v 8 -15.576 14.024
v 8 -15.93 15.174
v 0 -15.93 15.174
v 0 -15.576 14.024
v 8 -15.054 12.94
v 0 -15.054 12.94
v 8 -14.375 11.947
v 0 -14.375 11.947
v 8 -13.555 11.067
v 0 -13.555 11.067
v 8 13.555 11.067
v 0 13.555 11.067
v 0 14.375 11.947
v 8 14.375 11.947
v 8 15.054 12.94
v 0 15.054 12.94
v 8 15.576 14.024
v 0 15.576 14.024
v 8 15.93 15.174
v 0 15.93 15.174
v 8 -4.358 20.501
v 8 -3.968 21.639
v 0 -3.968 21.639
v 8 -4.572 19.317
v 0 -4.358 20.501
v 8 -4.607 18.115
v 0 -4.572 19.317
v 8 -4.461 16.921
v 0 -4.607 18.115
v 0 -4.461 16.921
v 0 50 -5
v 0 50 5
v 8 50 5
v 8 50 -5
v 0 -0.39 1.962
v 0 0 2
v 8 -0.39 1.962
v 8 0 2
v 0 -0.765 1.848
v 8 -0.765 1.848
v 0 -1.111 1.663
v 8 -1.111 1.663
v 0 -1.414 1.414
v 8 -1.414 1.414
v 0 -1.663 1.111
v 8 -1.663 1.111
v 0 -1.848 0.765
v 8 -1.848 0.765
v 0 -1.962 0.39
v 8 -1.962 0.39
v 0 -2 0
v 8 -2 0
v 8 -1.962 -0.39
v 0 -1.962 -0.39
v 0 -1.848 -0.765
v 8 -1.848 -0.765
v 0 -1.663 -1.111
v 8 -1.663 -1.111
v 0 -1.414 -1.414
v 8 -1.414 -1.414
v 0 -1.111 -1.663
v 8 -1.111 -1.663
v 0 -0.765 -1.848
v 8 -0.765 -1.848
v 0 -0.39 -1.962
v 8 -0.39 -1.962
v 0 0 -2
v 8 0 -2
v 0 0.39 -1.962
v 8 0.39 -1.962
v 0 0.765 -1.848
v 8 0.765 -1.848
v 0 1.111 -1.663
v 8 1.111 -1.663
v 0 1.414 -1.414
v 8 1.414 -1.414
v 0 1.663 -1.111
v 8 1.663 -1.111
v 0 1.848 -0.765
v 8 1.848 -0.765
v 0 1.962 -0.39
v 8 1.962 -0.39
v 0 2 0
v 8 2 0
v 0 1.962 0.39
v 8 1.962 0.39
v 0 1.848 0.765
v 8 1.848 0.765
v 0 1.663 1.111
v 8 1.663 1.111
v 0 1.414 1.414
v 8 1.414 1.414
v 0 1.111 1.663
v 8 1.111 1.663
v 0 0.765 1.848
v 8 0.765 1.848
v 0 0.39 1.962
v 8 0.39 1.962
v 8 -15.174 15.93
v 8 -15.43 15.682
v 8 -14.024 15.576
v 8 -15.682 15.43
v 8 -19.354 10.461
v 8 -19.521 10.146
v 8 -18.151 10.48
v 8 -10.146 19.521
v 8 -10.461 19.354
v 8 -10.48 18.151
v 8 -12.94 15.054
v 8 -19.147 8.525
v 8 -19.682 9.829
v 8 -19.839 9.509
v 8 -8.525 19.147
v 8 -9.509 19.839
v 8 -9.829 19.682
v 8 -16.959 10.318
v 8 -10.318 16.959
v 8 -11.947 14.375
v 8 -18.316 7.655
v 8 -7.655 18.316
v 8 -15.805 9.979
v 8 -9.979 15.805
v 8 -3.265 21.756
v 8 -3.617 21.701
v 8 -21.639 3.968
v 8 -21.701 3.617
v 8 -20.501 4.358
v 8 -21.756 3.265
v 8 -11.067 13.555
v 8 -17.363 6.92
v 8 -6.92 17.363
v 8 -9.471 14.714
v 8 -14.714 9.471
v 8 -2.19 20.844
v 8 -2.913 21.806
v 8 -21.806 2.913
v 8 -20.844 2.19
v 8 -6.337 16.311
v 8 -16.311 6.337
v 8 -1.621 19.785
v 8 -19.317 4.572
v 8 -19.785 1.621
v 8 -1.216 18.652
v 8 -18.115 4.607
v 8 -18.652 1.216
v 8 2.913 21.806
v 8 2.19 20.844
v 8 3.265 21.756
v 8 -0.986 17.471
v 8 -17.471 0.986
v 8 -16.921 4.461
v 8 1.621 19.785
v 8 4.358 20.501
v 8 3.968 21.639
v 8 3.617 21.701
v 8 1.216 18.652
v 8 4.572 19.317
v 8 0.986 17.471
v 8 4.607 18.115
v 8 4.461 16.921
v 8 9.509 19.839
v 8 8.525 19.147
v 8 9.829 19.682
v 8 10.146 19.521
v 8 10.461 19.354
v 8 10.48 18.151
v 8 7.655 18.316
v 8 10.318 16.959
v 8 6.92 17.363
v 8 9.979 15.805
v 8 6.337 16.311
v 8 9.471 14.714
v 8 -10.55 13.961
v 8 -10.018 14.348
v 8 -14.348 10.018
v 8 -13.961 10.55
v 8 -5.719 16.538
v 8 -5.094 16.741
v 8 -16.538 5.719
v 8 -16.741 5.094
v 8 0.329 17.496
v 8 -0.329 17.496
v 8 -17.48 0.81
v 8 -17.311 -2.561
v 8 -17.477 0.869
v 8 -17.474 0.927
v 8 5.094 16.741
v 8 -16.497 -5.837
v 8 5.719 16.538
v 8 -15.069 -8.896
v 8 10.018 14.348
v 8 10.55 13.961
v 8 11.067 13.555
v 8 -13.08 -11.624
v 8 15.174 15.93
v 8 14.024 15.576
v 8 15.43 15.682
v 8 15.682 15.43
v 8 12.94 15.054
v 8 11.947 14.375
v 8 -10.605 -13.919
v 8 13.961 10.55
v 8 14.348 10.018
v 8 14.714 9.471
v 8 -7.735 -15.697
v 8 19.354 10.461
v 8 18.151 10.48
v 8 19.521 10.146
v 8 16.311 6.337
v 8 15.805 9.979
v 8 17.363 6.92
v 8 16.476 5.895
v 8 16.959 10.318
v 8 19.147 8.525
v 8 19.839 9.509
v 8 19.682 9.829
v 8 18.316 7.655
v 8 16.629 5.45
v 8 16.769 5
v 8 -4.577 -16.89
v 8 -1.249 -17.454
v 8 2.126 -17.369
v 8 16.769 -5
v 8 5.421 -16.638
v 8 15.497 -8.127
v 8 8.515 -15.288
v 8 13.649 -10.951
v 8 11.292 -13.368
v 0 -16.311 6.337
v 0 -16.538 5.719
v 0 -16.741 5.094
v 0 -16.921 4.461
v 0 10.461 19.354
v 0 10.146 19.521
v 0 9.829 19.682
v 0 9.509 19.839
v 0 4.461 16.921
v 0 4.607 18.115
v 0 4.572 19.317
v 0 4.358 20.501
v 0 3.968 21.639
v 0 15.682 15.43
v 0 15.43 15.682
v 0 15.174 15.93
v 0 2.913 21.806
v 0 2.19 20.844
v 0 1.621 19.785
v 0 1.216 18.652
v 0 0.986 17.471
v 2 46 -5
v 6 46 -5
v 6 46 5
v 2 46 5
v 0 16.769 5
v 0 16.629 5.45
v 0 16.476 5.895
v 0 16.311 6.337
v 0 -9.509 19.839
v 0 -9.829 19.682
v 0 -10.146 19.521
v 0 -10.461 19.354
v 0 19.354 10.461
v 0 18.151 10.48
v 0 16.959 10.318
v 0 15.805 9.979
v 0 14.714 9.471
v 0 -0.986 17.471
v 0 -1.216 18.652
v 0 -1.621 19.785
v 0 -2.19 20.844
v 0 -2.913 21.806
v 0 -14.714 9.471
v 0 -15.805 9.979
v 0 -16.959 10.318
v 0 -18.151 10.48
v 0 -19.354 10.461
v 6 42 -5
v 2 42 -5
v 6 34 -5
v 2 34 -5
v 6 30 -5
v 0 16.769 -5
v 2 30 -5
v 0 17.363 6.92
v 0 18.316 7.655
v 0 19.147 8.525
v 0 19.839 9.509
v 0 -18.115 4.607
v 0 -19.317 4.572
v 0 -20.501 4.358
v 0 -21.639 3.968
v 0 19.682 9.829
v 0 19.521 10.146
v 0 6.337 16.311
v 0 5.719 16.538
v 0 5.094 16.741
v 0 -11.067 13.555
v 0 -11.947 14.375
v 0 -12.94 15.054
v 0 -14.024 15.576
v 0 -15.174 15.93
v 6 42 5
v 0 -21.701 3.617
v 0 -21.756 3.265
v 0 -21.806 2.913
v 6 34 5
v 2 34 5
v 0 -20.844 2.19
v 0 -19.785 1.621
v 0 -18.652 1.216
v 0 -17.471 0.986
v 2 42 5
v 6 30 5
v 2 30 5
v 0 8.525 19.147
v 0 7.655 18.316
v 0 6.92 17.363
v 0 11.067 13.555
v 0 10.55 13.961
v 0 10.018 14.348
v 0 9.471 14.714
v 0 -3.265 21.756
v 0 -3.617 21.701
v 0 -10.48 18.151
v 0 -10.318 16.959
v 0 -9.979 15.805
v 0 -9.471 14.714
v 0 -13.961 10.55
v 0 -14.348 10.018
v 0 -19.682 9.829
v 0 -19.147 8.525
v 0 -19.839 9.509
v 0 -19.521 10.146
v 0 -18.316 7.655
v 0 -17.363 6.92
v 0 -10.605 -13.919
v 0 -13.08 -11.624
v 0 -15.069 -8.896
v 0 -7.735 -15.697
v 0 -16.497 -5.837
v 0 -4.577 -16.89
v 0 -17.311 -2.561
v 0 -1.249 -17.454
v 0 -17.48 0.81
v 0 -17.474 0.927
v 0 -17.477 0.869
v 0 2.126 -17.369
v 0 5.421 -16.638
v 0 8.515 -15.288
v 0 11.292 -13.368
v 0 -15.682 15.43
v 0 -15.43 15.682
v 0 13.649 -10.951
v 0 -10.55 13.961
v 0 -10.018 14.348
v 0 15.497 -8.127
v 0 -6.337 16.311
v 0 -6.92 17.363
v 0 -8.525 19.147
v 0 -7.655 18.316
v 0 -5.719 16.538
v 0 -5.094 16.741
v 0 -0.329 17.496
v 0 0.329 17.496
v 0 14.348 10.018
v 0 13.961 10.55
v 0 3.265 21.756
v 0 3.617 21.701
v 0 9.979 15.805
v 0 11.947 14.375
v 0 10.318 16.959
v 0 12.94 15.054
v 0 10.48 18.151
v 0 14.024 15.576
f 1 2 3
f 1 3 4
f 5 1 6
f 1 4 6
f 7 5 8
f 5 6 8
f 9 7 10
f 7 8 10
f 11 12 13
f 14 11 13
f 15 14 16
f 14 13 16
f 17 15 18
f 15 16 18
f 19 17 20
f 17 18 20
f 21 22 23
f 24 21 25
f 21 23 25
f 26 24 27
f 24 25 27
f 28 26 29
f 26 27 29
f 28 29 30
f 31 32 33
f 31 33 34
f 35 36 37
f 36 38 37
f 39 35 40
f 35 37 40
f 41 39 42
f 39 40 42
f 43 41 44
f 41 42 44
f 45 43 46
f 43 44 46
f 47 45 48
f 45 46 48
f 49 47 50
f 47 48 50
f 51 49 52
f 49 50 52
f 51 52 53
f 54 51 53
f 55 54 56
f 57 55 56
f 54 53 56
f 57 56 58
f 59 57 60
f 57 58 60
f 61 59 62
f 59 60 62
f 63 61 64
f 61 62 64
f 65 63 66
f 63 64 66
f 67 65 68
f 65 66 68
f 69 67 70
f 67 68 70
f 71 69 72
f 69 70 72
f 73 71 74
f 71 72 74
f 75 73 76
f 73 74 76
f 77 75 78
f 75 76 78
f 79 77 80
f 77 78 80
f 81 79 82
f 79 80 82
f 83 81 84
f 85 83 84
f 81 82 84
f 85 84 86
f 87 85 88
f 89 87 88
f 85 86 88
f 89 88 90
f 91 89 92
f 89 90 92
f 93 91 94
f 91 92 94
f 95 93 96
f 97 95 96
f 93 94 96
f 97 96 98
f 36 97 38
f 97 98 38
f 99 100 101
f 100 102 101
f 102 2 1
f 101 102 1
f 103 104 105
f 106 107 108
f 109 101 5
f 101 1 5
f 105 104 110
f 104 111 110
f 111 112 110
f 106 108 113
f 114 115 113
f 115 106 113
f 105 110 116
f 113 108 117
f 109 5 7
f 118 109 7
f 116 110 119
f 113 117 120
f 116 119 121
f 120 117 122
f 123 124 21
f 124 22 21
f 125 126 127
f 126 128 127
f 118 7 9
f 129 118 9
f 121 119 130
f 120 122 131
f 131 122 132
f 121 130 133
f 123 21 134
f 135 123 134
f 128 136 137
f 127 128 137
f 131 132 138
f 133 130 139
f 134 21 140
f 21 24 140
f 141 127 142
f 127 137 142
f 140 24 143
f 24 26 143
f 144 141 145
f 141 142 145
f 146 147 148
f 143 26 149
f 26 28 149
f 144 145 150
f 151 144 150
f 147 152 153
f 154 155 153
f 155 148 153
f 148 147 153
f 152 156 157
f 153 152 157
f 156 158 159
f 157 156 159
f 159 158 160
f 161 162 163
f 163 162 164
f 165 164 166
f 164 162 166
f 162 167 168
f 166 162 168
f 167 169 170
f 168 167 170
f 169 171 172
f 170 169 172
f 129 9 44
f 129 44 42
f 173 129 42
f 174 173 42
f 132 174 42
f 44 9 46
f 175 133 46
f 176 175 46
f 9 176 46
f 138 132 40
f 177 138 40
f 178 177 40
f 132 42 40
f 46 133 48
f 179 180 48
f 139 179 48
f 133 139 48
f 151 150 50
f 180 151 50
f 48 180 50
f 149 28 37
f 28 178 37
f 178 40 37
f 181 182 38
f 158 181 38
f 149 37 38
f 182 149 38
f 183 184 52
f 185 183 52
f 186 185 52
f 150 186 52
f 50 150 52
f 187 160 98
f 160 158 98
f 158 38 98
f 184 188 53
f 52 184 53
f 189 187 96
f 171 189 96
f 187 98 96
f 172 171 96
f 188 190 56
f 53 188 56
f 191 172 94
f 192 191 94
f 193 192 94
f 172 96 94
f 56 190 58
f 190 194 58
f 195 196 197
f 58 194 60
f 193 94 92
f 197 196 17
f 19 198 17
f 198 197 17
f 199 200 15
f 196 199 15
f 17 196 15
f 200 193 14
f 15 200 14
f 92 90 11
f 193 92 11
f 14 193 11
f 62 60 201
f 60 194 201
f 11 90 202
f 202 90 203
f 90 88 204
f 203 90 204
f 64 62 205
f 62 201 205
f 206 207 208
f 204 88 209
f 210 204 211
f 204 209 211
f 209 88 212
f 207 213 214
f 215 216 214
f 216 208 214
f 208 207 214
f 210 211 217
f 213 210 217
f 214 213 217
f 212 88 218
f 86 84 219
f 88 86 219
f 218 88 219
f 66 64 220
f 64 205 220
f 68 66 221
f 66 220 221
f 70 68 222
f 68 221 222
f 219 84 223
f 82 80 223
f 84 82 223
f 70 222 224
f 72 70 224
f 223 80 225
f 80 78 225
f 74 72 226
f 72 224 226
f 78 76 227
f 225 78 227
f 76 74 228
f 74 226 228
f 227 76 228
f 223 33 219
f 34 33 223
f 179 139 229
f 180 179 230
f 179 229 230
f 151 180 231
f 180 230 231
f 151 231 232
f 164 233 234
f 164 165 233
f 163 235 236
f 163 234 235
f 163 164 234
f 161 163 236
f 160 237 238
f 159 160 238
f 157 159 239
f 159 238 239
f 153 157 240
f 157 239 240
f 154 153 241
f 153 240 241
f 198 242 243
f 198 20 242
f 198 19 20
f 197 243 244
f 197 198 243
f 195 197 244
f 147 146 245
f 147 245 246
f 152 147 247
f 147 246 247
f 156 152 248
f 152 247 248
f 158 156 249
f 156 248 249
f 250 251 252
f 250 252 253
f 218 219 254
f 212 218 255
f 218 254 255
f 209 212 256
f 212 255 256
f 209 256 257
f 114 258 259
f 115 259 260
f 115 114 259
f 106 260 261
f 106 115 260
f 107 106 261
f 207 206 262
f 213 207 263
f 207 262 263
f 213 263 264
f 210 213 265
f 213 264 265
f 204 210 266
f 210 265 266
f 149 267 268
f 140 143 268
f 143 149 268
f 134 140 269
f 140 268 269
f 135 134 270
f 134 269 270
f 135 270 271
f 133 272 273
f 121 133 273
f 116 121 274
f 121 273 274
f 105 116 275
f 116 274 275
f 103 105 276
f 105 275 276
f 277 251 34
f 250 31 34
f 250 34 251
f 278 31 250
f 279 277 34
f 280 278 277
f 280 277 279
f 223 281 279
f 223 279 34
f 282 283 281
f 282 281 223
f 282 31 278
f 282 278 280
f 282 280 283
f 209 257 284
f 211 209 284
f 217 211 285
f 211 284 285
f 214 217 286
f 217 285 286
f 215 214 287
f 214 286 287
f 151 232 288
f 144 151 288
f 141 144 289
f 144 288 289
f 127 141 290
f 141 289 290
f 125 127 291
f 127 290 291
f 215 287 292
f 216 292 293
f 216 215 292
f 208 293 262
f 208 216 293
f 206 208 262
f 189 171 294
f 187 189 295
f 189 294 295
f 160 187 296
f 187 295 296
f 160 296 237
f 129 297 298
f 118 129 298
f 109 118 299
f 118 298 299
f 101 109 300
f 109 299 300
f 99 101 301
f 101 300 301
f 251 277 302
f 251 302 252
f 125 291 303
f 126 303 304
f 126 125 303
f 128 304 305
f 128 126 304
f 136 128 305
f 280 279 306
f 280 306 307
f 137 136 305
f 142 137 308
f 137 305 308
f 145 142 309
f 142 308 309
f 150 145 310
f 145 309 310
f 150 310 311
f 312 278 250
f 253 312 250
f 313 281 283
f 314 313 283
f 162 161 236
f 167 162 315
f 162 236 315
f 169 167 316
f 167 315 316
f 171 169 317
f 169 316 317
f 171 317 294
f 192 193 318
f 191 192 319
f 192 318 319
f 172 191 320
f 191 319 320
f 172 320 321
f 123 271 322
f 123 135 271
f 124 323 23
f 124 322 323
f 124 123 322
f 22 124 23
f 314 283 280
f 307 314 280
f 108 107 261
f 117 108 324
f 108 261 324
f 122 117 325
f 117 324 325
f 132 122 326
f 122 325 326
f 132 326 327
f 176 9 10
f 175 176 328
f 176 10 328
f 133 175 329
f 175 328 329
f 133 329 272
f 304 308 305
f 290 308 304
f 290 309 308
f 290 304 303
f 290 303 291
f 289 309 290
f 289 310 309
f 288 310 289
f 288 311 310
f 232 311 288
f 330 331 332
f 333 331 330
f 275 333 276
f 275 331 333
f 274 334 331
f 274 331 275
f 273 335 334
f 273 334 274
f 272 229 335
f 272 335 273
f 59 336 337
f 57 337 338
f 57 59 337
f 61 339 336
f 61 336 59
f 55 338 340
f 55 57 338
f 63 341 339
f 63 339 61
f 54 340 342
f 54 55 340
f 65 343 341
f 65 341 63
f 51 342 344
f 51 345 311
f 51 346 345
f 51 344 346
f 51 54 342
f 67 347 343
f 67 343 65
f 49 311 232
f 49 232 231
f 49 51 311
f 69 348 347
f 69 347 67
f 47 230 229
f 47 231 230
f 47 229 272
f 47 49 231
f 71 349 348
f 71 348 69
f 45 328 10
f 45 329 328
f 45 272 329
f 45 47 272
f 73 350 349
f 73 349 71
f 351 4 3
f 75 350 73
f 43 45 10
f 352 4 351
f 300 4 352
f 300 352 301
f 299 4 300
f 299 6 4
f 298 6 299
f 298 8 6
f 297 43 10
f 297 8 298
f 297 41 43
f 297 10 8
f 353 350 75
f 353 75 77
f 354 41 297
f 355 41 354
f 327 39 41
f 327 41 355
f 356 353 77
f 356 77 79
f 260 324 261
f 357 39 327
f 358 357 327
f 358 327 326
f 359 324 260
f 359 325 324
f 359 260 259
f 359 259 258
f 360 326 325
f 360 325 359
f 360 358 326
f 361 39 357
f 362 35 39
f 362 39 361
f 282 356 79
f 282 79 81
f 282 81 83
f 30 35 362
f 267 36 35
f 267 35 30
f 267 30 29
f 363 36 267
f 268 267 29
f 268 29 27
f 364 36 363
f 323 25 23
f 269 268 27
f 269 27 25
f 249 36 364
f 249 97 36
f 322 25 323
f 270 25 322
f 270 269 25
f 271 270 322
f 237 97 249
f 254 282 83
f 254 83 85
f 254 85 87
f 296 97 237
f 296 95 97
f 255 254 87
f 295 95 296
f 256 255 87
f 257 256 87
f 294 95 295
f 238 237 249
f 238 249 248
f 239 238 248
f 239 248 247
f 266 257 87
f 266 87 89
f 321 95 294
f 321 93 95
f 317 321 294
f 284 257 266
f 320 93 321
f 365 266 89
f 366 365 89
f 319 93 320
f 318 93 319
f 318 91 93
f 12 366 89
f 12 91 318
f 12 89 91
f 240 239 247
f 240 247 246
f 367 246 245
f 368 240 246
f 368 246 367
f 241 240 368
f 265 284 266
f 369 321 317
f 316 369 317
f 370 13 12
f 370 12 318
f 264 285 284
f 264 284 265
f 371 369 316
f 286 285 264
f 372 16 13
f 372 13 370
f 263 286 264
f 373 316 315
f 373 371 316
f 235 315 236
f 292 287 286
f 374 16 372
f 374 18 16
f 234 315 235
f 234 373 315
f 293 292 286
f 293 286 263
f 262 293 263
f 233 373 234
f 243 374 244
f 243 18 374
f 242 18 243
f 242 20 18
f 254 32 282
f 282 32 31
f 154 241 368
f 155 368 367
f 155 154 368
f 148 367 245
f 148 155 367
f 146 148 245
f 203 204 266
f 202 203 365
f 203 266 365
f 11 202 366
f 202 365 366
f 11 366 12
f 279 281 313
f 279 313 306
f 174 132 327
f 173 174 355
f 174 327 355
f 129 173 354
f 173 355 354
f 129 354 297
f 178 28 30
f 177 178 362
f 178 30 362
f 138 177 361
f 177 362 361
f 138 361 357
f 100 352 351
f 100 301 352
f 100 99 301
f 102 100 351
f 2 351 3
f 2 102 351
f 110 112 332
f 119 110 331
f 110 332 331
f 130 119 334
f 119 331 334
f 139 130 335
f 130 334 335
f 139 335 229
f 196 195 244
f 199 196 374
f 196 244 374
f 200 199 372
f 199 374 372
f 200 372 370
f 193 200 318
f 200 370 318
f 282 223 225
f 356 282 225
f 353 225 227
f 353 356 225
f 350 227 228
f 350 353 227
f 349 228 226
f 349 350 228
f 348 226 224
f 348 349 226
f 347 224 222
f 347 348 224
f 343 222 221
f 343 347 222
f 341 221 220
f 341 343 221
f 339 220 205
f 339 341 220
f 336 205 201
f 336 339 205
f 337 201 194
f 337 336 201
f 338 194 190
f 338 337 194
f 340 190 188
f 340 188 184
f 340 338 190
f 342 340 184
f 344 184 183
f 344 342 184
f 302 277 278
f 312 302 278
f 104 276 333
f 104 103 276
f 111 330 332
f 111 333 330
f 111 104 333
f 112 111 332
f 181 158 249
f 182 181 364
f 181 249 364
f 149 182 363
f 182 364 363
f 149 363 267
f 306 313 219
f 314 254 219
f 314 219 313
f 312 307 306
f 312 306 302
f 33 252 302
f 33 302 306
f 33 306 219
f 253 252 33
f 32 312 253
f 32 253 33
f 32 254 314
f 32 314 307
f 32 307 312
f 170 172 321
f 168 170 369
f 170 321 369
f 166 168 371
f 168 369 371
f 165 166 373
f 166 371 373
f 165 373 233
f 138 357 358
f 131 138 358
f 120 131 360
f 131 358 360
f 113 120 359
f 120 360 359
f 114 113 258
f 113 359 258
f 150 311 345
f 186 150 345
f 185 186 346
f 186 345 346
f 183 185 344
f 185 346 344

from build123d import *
from build123d.topology import SkipClean

# Parameters (mm, degrees)
BASPROSKE_W             = 10
BASPROSKE_H             = 22
TOOTHCUT_DEPTH          = 33.680269277
TEETHCUTS_COUNT         = 20
TEETHCUTS_ANGLE         = 342
BORSKE_R                = 2
BORE_DEPTH              = 50.0000508
SKETCH3_W               = 21.477286505
SKETCH3_H               = 49.38738346
SKETCH3_W_2             = 5.914035414
SKETCH3_H_2             = 19.713451381
CUT_EXTRUDE1_DEPTH      = 10
SKETCH4_R               = 17.499
SKETCH4_R_2             = 2
BOSS_EXTRUDE2_DEPTH     = 10
BOSS_EXTRUDE3_DEPTH     = 10
CUT_EXTRUDE3_DEPTH      = 56.733338326
CUT_EXTRUDE3_DEPTH_BACK = 56.733338326
SKETCH7_W               = 2
SKETCH7_H               = 71.806333941
SKETCH6_W               = 4
SKETCH6_H               = 4
CUT_EXTRUDE5_DEPTH      = 58.293800183


with BuildPart() as part:
    # BasProSke → Base-Revolve (revolve)
    with BuildSketch(Plane(origin=(0, 0, 0), x_dir=(1, 0, 0), z_dir=(0, 1, 0)), mode=Mode.PRIVATE) as base_revolve_sk:
        with Locations((5, 11)):
            Rectangle(BASPROSKE_W, BASPROSKE_H)
    revolve(base_revolve_sk.sketch.rotate(Axis((-10, 0, 0), (1, 0, 0)), 180), axis=Axis((-10, 0, 0), (1, 0, 0)))

    # TooCutSke → ToothCut (cut, through all)
    with BuildSketch(Plane(origin=(0, 0, 0), x_dir=(0, 0, -1), z_dir=(1, 0, 0))):
        with BuildLine():
            ThreePointArc((0.986171591, 17.471189616), (0, 17.499), (-0.986171591, 17.471189616))
            ThreePointArc((-0.986171591, 17.471189616), (-1.626916196, 19.798789858), (-2.932850173, 21.829260982))
            ThreePointArc((-2.932850173, 21.829260982), (0, 22.0254), (2.932850173, 21.829260982))
            ThreePointArc((2.932850173, 21.829260982), (1.626916196, 19.798789858), (0.986171591, 17.471189616))
        make_face()
    toothcut = extrude(amount=TOOTHCUT_DEPTH, mode=Mode.SUBTRACT)

    # TeethCuts: ToothCut ×20 about axis
    teethcuts_axis = Axis((-10, 0, 0), (1, 0, 0))
    for i in range(1, TEETHCUTS_COUNT):
        add(toothcut.rotate(teethcuts_axis, i * TEETHCUTS_ANGLE / (TEETHCUTS_COUNT - 1)), mode=Mode.SUBTRACT)

    # BorSke → Bore (cut, symmetric)
    with BuildSketch(Plane(origin=(0, 0, 0), x_dir=(0, 0, -1), z_dir=(1, 0, 0))):
        with Locations(Location((0, 0, 0), (0, 0, 180))):
            Circle(BORSKE_R)
    extrude(amount=BORE_DEPTH, both=True, mode=Mode.SUBTRACT)

    # Sketch3 → Cut-Extrude1 (cut)
    with BuildSketch(Plane.ZY):
        with Locations((-15.842569701, 2.389280872)):
            Rectangle(SKETCH3_W, SKETCH3_H)
        Polygon((-0.493085796, 27.082972602), (-5.103926448, 27.082972602), (-5.103926448, 10.689681454), (-0.493085796, 10.689681454), (-0.493085796, 17.471189616), (-0.986171591, 17.471189616), (-0.986171591, 17.499), (-0.493085796, 17.499), align=None)
        with Locations((-2.146908741, -12.447685168)):
            Rectangle(SKETCH3_W_2, SKETCH3_H_2)
    extrude(amount=-CUT_EXTRUDE1_DEPTH, mode=Mode.SUBTRACT)

    # Sketch4 → Boss-Extrude2 (add)
    with SkipClean():  # the faces are left unmerged after this step: merging them gives an invalid solid
        with BuildSketch(Plane.ZY):
            Circle(SKETCH4_R)
            Circle(SKETCH4_R_2, mode=Mode.SUBTRACT)
        extrude(amount=-BOSS_EXTRUDE2_DEPTH)

    # Sketch5 → Boss-Extrude3 (add)
    with BuildSketch(Plane.ZY):
        with BuildLine():
            ThreePointArc((4.460989585, 16.920832513), (4.73110018, 16.847305188), (5, 16.76946633))
            Line((5, 16.76946633), (5, 50))
            Line((5, 50), (-5, 50))
            Line((-5, 50), (-5, 16.76946633))
            ThreePointArc((-5, 16.76946633), (-2.037353312, 17.37999403), (0.986171591, 17.471189616))
            ThreePointArc((0.986171591, 17.471189616), (1.620704589, 19.784848102), (2.912696354, 21.806333941))
            ThreePointArc((2.912696354, 21.806333941), (3.441558231, 21.729143493), (3.968388926, 21.639128664))
            ThreePointArc((3.968388926, 21.639128664), (4.572472634, 19.317333972), (4.460989585, 16.920832513))
        make_face()
        with BuildLine():
            ThreePointArc((-2, 0), (0, 2), (2, 0))
            Line((2, 0), (5, 0))
            Line((5, 0), (5, 16.76946633))
            ThreePointArc((5, 16.76946633), (4.73110018, 16.847305188), (4.460989585, 16.920832513))
            ThreePointArc((4.460989585, 16.920832513), (4.572472634, 19.317333972), (3.968388926, 21.639128664))
            ThreePointArc((3.968388926, 21.639128664), (3.441558231, 21.729143493), (2.912696354, 21.806333941))
            ThreePointArc((2.912696354, 21.806333941), (1.620704589, 19.784848102), (0.986171591, 17.471189616))
            ThreePointArc((0.986171591, 17.471189616), (-2.037353312, 17.37999403), (-5, 16.76946633))
            Line((-5, 16.76946633), (-5, 0))
            Line((-5, 0), (-2, 0))
        make_face()
    extrude(amount=-BOSS_EXTRUDE3_DEPTH)

    # Sketch7 → Cut-Extrude3 (cut, two sides: drawn at the far end of the back side and taken through both)
    with BuildSketch(Plane.XY.offset(5).offset(-CUT_EXTRUDE3_DEPTH_BACK)):
        with Locations((9, 14.096833029)):
            Rectangle(SKETCH7_W, SKETCH7_H)
    extrude(amount=CUT_EXTRUDE3_DEPTH + CUT_EXTRUDE3_DEPTH_BACK, mode=Mode.SUBTRACT)

    # Sketch6 → Cut-Extrude5 (cut, through all)
    with BuildSketch(Plane(origin=(0, 0, -5), x_dir=(-1, 0, 0), z_dir=(0, 0, -1))):
        with Locations((-4, 44)):
            Rectangle(SKETCH6_W, SKETCH6_H)
        with Locations((-4, 32)):
            Rectangle(SKETCH6_W, SKETCH6_H)
    extrude(amount=-CUT_EXTRUDE5_DEPTH, mode=Mode.SUBTRACT)


solid = part.part
